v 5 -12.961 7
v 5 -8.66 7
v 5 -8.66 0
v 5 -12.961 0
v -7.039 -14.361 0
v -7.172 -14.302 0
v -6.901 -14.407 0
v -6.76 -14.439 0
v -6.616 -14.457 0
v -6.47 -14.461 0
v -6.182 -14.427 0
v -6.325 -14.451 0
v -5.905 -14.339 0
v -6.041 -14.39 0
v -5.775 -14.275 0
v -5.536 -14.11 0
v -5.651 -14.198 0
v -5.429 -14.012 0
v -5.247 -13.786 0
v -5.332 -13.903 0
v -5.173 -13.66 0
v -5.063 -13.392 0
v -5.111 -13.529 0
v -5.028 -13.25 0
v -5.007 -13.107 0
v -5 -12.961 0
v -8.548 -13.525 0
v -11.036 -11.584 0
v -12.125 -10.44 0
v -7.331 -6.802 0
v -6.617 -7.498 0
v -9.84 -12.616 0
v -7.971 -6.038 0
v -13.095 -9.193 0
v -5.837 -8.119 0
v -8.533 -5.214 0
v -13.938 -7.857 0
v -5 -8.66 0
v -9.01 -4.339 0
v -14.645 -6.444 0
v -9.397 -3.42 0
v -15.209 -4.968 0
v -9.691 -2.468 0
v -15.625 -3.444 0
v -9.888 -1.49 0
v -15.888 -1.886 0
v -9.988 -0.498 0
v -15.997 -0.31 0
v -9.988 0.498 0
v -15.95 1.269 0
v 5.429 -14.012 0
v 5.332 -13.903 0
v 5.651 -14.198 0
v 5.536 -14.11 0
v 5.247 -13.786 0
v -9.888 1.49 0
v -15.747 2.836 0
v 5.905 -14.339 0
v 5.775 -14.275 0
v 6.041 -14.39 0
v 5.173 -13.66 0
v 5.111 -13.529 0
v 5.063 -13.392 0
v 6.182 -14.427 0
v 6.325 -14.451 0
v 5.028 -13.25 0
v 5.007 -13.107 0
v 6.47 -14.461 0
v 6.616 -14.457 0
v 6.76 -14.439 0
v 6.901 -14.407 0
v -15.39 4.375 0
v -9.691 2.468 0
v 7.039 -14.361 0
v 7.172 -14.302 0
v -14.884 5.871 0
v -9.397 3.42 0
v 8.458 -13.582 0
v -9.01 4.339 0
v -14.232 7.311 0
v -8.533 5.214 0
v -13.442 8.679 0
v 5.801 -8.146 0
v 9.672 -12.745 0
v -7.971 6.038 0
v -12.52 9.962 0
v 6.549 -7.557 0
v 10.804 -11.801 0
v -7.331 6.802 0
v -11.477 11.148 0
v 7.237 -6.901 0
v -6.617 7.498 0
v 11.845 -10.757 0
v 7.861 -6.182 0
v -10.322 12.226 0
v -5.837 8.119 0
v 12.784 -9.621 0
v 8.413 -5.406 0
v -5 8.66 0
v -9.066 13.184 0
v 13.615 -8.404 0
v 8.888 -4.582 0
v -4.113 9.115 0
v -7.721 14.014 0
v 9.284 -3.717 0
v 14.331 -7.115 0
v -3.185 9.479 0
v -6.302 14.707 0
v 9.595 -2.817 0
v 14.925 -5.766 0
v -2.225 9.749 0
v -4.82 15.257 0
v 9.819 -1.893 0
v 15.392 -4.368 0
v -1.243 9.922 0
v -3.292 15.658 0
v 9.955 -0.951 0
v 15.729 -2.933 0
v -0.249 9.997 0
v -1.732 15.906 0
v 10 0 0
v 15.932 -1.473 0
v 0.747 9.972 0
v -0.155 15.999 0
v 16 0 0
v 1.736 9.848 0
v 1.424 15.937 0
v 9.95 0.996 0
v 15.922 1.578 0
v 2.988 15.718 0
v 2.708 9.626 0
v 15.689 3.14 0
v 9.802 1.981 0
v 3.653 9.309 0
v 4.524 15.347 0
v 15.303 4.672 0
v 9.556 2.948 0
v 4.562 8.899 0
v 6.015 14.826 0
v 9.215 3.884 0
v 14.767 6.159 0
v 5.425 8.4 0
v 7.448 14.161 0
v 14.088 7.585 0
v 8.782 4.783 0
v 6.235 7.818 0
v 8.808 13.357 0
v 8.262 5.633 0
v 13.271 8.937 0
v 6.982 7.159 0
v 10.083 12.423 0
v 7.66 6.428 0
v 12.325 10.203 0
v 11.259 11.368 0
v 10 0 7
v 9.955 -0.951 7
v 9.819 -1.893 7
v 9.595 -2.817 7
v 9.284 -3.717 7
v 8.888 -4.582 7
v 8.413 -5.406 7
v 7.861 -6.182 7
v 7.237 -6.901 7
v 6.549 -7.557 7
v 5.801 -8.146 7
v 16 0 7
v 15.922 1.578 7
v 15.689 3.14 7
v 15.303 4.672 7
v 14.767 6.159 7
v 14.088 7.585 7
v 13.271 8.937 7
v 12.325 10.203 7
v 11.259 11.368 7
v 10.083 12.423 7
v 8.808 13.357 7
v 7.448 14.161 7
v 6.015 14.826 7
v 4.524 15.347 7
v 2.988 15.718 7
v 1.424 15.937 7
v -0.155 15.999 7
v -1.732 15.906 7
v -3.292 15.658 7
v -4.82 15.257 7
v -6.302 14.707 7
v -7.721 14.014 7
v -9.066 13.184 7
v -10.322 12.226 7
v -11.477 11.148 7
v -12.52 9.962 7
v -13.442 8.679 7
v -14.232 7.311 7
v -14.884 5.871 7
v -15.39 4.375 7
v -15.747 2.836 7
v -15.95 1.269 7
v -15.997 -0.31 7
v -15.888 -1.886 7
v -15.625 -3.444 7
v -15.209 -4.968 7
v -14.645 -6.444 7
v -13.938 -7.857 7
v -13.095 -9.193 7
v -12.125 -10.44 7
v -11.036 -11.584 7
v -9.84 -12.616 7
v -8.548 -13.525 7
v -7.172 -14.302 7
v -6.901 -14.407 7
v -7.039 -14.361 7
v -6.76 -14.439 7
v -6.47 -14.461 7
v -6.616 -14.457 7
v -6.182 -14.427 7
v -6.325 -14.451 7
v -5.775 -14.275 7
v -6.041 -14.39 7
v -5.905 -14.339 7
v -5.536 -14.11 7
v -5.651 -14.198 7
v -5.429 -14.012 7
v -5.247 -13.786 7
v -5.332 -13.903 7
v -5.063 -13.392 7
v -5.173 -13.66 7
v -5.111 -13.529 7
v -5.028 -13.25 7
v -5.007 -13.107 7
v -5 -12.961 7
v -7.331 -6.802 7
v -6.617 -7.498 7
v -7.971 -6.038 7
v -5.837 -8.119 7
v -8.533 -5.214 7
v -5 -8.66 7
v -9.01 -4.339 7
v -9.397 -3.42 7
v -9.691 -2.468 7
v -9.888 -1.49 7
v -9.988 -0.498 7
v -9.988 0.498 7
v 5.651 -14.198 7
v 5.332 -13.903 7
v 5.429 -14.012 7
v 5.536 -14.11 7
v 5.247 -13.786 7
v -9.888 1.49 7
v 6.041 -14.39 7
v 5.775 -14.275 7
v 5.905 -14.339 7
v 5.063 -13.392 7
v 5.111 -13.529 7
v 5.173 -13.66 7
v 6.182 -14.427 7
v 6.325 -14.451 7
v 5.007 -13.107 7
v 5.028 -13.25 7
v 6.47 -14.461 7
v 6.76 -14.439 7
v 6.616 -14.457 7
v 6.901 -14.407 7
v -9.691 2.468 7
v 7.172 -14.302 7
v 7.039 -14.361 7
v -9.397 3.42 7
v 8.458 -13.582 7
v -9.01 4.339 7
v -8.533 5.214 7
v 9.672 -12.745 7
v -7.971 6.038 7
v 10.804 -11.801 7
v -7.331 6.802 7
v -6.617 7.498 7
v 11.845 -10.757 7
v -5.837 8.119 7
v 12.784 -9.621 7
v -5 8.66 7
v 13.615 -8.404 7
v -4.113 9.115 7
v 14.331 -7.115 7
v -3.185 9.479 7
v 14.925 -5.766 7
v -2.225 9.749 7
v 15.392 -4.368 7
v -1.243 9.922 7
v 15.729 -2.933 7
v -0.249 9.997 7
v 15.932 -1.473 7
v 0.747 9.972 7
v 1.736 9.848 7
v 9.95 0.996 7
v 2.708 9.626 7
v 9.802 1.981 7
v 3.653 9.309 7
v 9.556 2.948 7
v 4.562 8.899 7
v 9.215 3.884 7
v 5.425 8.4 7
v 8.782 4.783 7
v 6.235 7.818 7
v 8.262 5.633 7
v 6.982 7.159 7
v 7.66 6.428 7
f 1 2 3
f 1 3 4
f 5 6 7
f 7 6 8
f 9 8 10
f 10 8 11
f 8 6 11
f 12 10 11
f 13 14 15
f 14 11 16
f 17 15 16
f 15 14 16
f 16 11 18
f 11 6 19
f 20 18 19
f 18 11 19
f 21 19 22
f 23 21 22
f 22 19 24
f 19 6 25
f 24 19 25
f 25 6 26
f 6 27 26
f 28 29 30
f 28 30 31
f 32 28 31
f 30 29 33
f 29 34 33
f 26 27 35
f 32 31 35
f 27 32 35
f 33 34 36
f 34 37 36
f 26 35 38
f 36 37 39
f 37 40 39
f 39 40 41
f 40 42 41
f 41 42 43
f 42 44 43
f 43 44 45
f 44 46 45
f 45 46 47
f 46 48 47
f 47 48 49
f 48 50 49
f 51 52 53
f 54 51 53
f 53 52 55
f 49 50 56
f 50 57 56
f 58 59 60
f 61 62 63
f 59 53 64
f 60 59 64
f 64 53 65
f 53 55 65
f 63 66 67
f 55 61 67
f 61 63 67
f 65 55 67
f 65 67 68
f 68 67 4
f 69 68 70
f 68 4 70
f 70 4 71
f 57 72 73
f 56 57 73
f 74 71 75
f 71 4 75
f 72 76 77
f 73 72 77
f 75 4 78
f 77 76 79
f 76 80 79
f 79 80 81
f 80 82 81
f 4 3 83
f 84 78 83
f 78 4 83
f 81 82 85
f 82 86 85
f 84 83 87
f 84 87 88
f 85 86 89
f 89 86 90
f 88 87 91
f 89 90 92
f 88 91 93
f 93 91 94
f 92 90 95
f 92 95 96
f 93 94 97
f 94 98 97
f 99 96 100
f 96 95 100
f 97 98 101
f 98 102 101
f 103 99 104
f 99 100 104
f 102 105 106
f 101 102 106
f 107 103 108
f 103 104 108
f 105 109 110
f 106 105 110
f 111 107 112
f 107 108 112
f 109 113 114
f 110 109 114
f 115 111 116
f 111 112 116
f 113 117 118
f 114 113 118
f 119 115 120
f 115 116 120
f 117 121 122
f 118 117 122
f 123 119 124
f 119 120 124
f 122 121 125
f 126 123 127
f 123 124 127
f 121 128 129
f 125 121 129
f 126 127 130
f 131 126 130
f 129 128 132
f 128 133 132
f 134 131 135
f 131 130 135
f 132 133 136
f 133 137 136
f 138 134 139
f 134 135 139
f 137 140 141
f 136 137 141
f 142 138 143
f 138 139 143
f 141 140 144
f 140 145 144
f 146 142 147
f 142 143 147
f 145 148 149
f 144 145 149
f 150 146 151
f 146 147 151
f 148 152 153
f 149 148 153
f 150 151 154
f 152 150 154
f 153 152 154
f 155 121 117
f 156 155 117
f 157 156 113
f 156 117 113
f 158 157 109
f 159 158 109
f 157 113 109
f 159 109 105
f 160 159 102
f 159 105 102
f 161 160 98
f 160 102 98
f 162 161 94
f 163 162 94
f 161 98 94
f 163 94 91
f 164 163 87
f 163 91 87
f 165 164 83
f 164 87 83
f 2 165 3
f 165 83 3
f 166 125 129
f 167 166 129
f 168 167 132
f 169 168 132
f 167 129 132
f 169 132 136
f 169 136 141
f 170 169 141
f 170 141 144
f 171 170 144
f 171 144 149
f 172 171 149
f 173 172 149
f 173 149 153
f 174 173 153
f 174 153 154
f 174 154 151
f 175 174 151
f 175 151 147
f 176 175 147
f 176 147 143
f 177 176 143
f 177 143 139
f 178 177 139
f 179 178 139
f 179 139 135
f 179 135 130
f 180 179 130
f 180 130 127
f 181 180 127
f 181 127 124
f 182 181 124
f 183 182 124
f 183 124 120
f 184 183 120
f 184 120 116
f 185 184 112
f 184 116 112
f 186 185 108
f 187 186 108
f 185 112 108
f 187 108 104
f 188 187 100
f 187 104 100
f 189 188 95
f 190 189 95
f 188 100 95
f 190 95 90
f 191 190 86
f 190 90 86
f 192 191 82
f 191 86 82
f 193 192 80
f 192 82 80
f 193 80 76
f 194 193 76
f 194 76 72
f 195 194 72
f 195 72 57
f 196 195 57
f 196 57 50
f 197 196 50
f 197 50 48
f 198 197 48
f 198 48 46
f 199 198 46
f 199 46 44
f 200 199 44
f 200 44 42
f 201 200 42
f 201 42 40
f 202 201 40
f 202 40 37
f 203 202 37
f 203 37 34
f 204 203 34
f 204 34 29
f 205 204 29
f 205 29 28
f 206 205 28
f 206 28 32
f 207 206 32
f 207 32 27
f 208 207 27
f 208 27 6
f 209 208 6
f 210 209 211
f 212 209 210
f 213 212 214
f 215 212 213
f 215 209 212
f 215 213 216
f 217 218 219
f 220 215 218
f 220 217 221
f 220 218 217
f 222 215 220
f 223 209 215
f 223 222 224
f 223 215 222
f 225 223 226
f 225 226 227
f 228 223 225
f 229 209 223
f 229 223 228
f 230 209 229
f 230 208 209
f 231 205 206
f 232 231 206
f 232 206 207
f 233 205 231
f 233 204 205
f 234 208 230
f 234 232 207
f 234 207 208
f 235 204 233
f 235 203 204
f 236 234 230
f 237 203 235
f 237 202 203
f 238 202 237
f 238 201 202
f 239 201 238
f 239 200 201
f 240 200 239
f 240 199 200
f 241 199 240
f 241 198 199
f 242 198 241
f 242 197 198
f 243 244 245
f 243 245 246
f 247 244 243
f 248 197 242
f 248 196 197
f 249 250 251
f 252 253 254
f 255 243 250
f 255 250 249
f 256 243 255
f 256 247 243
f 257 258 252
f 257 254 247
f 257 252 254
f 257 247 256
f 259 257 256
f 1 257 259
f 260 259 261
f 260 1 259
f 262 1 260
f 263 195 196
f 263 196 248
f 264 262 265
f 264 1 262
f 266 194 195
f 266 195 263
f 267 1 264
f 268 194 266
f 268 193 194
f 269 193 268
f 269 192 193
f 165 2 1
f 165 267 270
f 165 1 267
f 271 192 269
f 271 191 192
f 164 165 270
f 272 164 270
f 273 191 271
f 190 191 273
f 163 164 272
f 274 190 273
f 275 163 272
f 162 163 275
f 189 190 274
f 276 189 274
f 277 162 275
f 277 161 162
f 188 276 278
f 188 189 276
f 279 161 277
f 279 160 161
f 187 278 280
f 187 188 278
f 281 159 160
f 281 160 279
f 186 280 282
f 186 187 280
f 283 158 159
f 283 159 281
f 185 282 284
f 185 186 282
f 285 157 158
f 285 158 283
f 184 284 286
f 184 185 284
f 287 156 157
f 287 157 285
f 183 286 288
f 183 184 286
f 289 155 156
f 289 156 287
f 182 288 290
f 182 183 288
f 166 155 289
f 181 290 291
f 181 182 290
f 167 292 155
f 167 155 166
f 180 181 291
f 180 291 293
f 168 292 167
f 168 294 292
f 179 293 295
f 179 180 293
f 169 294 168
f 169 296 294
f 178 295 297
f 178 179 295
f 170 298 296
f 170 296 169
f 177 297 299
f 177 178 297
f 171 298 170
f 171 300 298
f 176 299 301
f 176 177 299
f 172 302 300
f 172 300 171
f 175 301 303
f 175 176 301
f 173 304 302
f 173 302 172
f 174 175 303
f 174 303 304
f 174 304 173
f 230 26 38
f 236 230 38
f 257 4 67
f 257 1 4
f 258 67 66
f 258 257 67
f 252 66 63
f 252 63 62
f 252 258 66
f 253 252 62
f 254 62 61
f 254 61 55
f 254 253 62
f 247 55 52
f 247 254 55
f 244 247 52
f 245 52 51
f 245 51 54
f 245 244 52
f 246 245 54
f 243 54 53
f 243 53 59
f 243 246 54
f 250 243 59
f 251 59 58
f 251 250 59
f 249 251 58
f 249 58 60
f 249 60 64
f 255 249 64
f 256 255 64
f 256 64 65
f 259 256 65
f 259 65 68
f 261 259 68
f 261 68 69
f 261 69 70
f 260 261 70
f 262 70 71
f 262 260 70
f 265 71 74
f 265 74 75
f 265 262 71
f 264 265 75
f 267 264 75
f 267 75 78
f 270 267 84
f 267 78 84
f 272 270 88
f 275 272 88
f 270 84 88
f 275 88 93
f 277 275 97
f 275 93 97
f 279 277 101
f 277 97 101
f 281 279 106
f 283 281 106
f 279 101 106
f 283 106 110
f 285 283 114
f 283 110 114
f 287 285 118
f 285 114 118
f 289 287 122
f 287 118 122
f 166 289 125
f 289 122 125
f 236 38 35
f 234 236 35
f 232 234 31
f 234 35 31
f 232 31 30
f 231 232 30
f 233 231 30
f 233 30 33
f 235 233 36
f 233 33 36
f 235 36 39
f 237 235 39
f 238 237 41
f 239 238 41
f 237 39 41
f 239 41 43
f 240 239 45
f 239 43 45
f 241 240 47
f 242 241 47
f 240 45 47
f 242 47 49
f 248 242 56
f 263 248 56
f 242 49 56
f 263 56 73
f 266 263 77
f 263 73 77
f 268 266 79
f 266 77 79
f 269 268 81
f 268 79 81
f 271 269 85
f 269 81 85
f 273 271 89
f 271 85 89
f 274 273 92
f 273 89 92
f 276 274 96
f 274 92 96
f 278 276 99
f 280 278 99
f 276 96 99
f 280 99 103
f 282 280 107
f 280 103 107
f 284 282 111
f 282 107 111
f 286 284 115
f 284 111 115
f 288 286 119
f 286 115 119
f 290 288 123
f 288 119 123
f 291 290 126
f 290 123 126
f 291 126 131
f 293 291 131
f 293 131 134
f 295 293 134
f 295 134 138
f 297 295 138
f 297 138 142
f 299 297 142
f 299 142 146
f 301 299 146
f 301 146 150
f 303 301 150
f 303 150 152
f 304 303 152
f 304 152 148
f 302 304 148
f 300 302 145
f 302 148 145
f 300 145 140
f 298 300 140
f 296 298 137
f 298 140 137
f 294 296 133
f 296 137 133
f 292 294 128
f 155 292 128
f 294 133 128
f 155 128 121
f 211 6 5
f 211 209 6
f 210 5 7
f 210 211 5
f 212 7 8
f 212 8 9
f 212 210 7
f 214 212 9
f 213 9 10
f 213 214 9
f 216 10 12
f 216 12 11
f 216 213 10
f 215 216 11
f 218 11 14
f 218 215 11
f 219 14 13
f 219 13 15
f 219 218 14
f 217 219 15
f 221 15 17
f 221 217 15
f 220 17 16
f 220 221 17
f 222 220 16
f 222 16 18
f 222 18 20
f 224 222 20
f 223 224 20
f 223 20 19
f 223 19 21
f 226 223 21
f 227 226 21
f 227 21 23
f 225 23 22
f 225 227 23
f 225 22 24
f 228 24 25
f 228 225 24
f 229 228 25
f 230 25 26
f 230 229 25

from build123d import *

# Parameters (mm, degrees)
F1_DEPTH = 7
F2_R     = 1.5


with BuildPart() as f1:
    # F0 (on Top) → F1 (new body)
    with BuildSketch(Plane.XY):
        with BuildLine():
            ThreePointArc((-5, -8.660254), (-5, 8.660254), (10, 0))
            ThreePointArc((10, 0), (8.660254, -5), (5, -8.660254))
            Line((5, -8.660254), (5, -15.198684))
            ThreePointArc((5, -15.198684), (12.961481, -9.380832), (16, 0))
            ThreePointArc((16, 0), (-9.380832, 12.961481), (-5, -15.198684))
            Line((-5, -15.198684), (-5, -8.660254))
        make_face()
    extrude(amount=F1_DEPTH)

    # F2
    f2_edges = [f1.edges().sort_by_distance(p)[0] for p in [
        (-5, -15.198684, 3.5),
        (5, -15.198684, 3.5),
    ]]
    fillet(f2_edges, radius=F2_R)


solid = f1.part
